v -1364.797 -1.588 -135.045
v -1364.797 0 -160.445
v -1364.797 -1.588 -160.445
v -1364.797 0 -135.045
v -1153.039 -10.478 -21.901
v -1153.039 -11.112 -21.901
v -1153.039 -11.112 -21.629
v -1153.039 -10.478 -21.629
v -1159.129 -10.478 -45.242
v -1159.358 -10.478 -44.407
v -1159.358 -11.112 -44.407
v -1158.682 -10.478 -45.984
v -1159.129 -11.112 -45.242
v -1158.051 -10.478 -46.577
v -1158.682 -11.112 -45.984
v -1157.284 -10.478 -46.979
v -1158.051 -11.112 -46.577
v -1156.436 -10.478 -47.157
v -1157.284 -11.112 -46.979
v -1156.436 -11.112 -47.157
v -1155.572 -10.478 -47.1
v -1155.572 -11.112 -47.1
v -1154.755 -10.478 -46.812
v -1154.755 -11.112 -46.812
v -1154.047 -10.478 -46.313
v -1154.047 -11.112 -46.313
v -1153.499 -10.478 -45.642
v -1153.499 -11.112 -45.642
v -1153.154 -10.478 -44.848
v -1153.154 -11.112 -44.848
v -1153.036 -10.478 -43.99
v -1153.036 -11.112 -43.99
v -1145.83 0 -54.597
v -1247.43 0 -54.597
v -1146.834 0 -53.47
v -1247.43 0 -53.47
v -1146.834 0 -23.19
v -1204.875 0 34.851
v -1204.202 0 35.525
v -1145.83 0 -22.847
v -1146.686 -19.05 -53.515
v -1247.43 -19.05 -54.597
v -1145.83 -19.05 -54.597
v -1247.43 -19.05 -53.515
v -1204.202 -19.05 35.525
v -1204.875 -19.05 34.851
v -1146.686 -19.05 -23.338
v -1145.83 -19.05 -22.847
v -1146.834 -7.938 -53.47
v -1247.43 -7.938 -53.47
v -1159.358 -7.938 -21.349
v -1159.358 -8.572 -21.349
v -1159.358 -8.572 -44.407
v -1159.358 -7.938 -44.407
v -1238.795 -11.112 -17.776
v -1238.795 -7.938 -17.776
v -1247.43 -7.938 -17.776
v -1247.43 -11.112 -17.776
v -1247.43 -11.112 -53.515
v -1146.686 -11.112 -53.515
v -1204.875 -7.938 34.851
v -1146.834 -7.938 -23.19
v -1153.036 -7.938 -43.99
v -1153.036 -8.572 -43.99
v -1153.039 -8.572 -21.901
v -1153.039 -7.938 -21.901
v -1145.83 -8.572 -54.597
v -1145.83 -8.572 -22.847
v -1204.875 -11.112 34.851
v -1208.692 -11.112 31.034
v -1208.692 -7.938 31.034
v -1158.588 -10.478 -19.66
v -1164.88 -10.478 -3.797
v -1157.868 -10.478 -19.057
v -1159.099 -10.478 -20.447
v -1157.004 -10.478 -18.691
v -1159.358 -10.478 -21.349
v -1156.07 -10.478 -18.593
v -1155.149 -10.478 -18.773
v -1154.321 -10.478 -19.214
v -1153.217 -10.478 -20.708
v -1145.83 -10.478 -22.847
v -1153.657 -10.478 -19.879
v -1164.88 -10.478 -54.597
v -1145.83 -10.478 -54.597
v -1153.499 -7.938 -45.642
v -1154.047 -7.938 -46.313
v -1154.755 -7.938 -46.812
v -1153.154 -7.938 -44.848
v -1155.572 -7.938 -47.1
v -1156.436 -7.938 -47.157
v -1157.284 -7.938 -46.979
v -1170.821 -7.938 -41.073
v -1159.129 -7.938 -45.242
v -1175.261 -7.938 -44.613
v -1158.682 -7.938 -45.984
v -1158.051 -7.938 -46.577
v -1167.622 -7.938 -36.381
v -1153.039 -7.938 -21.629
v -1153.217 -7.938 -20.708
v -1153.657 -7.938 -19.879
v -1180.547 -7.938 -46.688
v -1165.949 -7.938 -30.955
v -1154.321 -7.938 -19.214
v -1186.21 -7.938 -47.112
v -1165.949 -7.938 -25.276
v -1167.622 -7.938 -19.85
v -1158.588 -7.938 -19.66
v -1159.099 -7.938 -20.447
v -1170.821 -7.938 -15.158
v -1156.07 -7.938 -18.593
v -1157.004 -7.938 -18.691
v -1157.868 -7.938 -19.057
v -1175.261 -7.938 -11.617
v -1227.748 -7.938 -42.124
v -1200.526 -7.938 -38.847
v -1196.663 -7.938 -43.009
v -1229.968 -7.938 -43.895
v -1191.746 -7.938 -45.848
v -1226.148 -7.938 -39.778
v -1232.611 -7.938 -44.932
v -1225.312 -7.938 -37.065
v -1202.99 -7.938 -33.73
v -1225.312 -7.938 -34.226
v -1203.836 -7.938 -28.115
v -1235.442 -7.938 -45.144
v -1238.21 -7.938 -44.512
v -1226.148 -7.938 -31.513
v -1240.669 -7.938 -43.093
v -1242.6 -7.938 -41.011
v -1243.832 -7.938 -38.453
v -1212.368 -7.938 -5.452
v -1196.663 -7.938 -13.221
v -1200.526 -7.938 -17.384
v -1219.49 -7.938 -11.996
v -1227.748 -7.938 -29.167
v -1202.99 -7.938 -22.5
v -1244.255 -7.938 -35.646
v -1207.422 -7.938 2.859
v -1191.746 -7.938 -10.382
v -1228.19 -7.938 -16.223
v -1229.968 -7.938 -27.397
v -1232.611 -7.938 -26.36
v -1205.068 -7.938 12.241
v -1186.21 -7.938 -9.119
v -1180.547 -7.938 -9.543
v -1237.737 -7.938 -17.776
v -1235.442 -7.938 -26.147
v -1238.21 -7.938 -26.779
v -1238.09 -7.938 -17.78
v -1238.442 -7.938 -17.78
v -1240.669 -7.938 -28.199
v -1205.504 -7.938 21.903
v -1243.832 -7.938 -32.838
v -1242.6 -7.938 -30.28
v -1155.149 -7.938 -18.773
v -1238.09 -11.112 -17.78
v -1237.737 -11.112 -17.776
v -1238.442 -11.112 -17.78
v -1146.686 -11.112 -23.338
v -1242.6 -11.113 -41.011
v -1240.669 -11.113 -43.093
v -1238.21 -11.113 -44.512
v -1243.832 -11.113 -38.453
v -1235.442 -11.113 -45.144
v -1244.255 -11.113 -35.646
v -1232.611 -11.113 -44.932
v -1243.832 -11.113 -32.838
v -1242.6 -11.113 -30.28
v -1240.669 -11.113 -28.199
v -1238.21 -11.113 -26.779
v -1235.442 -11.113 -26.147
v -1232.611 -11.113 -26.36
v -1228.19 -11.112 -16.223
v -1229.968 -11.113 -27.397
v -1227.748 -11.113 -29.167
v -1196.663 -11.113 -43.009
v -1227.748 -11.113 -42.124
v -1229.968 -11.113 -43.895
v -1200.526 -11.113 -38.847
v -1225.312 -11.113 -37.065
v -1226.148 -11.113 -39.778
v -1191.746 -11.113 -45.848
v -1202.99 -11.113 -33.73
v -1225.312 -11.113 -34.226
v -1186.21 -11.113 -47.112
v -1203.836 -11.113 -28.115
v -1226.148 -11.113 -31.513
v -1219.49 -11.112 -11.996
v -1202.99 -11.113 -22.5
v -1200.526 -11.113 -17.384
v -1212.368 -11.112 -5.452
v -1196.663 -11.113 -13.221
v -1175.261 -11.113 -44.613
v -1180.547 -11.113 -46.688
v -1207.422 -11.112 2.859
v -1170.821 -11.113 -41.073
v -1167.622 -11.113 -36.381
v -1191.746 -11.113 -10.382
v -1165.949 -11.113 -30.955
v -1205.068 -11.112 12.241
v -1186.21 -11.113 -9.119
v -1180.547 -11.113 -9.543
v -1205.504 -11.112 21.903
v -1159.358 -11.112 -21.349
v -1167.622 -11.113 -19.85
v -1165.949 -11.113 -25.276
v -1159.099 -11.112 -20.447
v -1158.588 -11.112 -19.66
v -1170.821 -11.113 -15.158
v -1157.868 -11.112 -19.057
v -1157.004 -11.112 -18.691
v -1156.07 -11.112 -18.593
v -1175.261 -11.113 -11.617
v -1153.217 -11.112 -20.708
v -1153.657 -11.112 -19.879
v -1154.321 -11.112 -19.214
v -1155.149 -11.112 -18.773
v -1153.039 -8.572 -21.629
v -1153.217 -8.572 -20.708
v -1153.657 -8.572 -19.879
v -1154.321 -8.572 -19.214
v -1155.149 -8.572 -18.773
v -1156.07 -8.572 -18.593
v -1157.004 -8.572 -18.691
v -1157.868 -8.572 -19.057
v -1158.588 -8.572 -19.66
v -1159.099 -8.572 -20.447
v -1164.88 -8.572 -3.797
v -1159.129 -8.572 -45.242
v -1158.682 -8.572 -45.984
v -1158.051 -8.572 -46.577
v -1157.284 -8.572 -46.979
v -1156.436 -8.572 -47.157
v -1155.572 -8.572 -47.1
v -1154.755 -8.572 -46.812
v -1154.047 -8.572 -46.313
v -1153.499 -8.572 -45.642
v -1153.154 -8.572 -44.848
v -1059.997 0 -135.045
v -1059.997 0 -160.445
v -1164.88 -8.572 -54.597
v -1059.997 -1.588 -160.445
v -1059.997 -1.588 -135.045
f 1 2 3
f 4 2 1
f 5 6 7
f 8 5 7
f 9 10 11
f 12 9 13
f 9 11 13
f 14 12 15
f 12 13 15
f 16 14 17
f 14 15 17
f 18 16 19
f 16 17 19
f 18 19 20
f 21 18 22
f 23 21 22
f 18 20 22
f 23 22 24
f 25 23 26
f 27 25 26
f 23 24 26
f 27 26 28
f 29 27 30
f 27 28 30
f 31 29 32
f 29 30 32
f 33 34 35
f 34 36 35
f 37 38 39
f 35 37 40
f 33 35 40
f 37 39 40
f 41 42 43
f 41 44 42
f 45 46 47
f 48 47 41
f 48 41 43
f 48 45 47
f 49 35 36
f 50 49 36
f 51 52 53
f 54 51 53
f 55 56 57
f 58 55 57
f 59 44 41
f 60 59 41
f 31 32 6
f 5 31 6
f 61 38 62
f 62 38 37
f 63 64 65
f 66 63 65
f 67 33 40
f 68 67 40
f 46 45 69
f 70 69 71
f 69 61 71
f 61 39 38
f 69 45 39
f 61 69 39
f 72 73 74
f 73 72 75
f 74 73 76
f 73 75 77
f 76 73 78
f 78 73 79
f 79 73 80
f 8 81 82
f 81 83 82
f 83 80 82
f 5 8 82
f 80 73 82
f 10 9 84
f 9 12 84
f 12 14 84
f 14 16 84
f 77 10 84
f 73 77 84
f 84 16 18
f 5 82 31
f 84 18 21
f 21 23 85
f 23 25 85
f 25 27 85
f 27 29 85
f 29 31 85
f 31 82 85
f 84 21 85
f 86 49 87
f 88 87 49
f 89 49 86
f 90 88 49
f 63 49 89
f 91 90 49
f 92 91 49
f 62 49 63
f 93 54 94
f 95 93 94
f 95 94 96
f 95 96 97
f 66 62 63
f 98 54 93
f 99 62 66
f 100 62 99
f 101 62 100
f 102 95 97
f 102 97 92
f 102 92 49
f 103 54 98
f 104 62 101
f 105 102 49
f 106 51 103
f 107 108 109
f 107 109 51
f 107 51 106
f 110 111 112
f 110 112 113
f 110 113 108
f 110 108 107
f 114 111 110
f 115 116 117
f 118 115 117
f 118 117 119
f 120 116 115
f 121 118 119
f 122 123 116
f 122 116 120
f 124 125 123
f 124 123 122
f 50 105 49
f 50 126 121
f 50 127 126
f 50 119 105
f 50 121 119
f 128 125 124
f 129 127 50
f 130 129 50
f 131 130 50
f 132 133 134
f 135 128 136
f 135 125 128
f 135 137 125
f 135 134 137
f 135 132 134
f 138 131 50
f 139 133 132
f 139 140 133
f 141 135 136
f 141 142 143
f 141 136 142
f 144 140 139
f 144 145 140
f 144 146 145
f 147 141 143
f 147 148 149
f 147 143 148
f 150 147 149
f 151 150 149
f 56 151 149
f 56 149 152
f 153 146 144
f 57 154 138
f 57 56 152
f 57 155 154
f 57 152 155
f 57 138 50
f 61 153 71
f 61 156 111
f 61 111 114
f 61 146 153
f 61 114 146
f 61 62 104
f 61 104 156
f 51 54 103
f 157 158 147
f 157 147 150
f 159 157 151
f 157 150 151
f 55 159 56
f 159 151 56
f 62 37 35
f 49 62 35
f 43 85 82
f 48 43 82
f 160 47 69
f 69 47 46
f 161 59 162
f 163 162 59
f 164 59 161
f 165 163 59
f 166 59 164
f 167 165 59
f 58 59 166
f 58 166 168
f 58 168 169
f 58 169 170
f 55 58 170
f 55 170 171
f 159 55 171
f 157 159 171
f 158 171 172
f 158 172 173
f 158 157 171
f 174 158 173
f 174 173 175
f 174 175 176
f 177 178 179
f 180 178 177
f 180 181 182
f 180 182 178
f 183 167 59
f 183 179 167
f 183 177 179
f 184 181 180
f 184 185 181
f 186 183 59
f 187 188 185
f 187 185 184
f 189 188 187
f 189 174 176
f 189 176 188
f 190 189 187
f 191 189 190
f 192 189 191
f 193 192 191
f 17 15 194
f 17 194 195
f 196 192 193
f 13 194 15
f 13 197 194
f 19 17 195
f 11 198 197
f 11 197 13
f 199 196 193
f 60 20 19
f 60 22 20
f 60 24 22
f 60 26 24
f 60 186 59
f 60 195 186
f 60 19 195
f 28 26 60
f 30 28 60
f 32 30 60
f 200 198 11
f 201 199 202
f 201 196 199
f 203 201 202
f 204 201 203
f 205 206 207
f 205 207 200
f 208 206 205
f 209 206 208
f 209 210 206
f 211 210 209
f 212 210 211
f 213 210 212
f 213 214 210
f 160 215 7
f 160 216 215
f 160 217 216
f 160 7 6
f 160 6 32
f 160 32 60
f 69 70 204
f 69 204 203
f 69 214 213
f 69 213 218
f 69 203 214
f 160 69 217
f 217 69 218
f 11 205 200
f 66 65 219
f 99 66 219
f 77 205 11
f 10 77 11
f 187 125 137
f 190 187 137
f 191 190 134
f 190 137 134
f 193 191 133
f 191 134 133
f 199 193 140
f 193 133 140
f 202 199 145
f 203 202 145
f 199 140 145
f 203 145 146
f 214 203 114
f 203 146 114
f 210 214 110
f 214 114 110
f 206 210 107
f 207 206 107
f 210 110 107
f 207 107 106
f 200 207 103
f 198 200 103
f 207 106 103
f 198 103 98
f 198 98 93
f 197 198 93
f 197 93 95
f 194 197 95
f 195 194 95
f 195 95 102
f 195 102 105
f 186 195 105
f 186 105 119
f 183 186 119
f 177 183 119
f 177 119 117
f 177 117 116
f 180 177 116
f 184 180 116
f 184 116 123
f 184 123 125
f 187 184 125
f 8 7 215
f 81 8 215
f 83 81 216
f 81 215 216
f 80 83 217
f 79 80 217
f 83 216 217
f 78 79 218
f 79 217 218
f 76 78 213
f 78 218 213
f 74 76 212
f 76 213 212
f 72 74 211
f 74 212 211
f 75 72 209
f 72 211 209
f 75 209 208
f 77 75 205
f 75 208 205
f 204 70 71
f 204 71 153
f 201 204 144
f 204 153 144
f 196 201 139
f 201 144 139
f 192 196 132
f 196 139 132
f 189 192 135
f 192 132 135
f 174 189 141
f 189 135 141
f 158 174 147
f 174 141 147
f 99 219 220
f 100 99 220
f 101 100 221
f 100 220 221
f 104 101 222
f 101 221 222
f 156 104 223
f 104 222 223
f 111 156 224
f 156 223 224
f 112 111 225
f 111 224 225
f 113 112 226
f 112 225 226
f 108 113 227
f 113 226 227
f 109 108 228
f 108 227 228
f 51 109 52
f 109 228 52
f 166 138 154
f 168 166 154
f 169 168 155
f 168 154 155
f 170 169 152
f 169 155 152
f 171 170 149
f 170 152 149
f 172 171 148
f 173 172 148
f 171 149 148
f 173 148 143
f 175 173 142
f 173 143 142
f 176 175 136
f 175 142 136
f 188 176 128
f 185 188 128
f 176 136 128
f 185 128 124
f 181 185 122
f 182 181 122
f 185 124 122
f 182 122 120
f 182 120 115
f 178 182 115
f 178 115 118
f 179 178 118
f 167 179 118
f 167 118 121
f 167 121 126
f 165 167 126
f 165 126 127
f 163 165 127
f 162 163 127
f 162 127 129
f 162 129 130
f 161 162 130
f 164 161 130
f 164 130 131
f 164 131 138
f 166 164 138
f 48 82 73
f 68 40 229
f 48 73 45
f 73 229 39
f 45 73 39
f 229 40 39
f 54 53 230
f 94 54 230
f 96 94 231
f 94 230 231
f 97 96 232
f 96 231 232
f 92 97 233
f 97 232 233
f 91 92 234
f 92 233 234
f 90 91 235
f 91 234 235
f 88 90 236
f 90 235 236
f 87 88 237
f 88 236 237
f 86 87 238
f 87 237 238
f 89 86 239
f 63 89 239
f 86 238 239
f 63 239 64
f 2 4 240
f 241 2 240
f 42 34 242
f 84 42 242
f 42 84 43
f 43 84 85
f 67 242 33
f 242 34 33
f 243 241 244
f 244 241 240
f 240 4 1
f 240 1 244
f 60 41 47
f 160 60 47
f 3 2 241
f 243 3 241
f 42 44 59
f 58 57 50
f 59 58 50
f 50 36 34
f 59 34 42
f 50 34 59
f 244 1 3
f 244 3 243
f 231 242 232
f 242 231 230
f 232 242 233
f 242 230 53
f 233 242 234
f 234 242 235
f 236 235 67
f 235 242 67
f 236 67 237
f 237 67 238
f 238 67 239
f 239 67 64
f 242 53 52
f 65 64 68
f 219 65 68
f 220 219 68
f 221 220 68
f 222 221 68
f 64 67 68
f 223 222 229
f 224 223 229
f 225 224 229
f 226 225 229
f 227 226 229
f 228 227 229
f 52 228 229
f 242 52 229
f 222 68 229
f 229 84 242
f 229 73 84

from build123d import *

# Parameters (mm, degrees)
F0_W      = 304.8
F0_H      = 25.4
F1_DEPTH  = 1.5875
F3_DEPTH  = 19.05
F5_DEPTH  = 7.9375
F8_DEPTH  = 7.9375
F9_D      = 38.1
F11_D     = 19.05
F13_DEPTH = 11.1135
F15_DEPTH = 19.05


with BuildPart() as f1:
    # F0 (on Front) → F1 (new body)
    with BuildSketch(Plane.XZ):
        with Locations((-1212.396877, -147.744871)):
            Rectangle(F0_W, F0_H)
    extrude(amount=F1_DEPTH)


with BuildPart() as f3:
    # F2 (on Front) → F3 (new body)
    with BuildSketch(Plane.XZ):
        with BuildLine():
            Line((-1202.980205, -54.59708), (-1145.830205, -54.59708))
            Line((-1145.830205, -54.59708), (-1145.830205, -22.84708))
            Line((-1145.830205, -22.84708), (-1204.20187, 35.524585))
            Line((-1204.20187, 35.524585), (-1208.691998, 31.034457))
            ThreePointArc((-1208.691998, 31.034457), (-1209.592483, -1.476633), (-1237.736912, -17.776111))
            ThreePointArc((-1237.736912, -17.776111), (-1238.265865, -17.780304), (-1238.794818, -17.776111))
            Line((-1238.794818, -17.776111), (-1247.430205, -17.776111))
            Line((-1247.430205, -17.776111), (-1247.430205, -54.59708))
            Line((-1247.430205, -54.59708), (-1202.980205, -54.59708))
        make_face()
    extrude(amount=F3_DEPTH)

    # F4 (on face) → F5 (cut)
    with BuildSketch(Plane.XZ.offset(19.05)):
        with BuildLine():
            Line((-1146.685898, -23.338426), (-1204.875389, 34.851066))
            Line((-1204.875389, 34.851066), (-1208.691998, 31.034457))
            ThreePointArc((-1208.691998, 31.034457), (-1209.866575, -1.929051), (-1238.794818, -17.776111))
            Line((-1238.794818, -17.776111), (-1247.430205, -17.776111))
            Line((-1247.430205, -17.776111), (-1247.430205, -53.515282))
            Line((-1247.430205, -53.515282), (-1245.987415, -53.515282))
            Line((-1245.987415, -53.515282), (-1146.685898, -53.515282))
            Line((-1146.685898, -53.515282), (-1146.685898, -23.338426))
        make_face()
    extrude(amount=-F5_DEPTH, mode=Mode.SUBTRACT)

    # F6 (on face) → F8 (cut)
    with BuildSketch(Plane(origin=(0, 0, 0), x_dir=(-1, 0, 0), z_dir=(0, 1, 0))):
        with BuildLine():
            Line((1208.691998, 31.034457), (1204.875389, 34.851066))
            Line((1204.875389, 34.851066), (1146.834178, -23.190145))
            Line((1146.834178, -23.190145), (1146.834178, -53.469513))
            Line((1146.834178, -53.469513), (1247.430205, -53.469513))
            Line((1247.430205, -53.469513), (1247.430205, -17.776111))
            Line((1247.430205, -17.776111), (1238.794818, -17.776111))
            ThreePointArc((1238.794818, -17.776111), (1209.866575, -1.929051), (1208.691998, 31.034457))
        make_face()
    extrude(amount=-F8_DEPTH, mode=Mode.SUBTRACT)

    # F9 (through all)
    with Locations(Plane.XZ.offset(11.1125)):
        with Locations((-1184.785898, -28.115282)):
            Hole(F9_D / 2)

    # F11 (through all)
    with Locations(Plane.XZ.offset(11.1125)):
        with Locations((-1234.730205, -35.645696)):
            Hole(F11_D / 2)

    # F12 (on face) → F13 (cut, through all)
    with BuildSketch(Plane.XZ.offset(11.1125)):
        with BuildLine():
            Line((-1159.358487, -22.181587), (-1159.358487, -43.573976))
            Line((-1159.358487, -43.573976), (-1159.358487, -44.406587))
            ThreePointArc((-1159.358487, -44.406587), (-1156.002088, -47.158408), (-1153.035898, -43.989867))
            Line((-1153.035898, -43.989867), (-1153.038781, -21.900549))
            Line((-1153.038781, -21.900549), (-1153.038816, -21.629186))
            ThreePointArc((-1153.038816, -21.629186), (-1156.070259, -18.593398), (-1159.358487, -21.348976))
            Line((-1159.358487, -21.348976), (-1159.358487, -22.181587))
        make_face()
    extrude(amount=-F13_DEPTH, mode=Mode.SUBTRACT)

    # F14 (on face) → F15 (cut)
    with BuildSketch(Plane.YZ.offset(-1145.830205)):
        Polygon((-10.4775, -54.59708), (-9.525, -54.59708), (-8.5725, -54.59708), (-8.5725, -22.84708), (-10.4775, -22.84708), align=None)
        Polygon((-10.4775, -3.79708), (-10.4775, -22.84708), (-8.5725, -22.84708), (-8.5725, -3.79708), (-9.525, -3.79708), align=None)
    extrude(amount=-F15_DEPTH, mode=Mode.SUBTRACT)


solid = Compound([f1.part, f3.part])
